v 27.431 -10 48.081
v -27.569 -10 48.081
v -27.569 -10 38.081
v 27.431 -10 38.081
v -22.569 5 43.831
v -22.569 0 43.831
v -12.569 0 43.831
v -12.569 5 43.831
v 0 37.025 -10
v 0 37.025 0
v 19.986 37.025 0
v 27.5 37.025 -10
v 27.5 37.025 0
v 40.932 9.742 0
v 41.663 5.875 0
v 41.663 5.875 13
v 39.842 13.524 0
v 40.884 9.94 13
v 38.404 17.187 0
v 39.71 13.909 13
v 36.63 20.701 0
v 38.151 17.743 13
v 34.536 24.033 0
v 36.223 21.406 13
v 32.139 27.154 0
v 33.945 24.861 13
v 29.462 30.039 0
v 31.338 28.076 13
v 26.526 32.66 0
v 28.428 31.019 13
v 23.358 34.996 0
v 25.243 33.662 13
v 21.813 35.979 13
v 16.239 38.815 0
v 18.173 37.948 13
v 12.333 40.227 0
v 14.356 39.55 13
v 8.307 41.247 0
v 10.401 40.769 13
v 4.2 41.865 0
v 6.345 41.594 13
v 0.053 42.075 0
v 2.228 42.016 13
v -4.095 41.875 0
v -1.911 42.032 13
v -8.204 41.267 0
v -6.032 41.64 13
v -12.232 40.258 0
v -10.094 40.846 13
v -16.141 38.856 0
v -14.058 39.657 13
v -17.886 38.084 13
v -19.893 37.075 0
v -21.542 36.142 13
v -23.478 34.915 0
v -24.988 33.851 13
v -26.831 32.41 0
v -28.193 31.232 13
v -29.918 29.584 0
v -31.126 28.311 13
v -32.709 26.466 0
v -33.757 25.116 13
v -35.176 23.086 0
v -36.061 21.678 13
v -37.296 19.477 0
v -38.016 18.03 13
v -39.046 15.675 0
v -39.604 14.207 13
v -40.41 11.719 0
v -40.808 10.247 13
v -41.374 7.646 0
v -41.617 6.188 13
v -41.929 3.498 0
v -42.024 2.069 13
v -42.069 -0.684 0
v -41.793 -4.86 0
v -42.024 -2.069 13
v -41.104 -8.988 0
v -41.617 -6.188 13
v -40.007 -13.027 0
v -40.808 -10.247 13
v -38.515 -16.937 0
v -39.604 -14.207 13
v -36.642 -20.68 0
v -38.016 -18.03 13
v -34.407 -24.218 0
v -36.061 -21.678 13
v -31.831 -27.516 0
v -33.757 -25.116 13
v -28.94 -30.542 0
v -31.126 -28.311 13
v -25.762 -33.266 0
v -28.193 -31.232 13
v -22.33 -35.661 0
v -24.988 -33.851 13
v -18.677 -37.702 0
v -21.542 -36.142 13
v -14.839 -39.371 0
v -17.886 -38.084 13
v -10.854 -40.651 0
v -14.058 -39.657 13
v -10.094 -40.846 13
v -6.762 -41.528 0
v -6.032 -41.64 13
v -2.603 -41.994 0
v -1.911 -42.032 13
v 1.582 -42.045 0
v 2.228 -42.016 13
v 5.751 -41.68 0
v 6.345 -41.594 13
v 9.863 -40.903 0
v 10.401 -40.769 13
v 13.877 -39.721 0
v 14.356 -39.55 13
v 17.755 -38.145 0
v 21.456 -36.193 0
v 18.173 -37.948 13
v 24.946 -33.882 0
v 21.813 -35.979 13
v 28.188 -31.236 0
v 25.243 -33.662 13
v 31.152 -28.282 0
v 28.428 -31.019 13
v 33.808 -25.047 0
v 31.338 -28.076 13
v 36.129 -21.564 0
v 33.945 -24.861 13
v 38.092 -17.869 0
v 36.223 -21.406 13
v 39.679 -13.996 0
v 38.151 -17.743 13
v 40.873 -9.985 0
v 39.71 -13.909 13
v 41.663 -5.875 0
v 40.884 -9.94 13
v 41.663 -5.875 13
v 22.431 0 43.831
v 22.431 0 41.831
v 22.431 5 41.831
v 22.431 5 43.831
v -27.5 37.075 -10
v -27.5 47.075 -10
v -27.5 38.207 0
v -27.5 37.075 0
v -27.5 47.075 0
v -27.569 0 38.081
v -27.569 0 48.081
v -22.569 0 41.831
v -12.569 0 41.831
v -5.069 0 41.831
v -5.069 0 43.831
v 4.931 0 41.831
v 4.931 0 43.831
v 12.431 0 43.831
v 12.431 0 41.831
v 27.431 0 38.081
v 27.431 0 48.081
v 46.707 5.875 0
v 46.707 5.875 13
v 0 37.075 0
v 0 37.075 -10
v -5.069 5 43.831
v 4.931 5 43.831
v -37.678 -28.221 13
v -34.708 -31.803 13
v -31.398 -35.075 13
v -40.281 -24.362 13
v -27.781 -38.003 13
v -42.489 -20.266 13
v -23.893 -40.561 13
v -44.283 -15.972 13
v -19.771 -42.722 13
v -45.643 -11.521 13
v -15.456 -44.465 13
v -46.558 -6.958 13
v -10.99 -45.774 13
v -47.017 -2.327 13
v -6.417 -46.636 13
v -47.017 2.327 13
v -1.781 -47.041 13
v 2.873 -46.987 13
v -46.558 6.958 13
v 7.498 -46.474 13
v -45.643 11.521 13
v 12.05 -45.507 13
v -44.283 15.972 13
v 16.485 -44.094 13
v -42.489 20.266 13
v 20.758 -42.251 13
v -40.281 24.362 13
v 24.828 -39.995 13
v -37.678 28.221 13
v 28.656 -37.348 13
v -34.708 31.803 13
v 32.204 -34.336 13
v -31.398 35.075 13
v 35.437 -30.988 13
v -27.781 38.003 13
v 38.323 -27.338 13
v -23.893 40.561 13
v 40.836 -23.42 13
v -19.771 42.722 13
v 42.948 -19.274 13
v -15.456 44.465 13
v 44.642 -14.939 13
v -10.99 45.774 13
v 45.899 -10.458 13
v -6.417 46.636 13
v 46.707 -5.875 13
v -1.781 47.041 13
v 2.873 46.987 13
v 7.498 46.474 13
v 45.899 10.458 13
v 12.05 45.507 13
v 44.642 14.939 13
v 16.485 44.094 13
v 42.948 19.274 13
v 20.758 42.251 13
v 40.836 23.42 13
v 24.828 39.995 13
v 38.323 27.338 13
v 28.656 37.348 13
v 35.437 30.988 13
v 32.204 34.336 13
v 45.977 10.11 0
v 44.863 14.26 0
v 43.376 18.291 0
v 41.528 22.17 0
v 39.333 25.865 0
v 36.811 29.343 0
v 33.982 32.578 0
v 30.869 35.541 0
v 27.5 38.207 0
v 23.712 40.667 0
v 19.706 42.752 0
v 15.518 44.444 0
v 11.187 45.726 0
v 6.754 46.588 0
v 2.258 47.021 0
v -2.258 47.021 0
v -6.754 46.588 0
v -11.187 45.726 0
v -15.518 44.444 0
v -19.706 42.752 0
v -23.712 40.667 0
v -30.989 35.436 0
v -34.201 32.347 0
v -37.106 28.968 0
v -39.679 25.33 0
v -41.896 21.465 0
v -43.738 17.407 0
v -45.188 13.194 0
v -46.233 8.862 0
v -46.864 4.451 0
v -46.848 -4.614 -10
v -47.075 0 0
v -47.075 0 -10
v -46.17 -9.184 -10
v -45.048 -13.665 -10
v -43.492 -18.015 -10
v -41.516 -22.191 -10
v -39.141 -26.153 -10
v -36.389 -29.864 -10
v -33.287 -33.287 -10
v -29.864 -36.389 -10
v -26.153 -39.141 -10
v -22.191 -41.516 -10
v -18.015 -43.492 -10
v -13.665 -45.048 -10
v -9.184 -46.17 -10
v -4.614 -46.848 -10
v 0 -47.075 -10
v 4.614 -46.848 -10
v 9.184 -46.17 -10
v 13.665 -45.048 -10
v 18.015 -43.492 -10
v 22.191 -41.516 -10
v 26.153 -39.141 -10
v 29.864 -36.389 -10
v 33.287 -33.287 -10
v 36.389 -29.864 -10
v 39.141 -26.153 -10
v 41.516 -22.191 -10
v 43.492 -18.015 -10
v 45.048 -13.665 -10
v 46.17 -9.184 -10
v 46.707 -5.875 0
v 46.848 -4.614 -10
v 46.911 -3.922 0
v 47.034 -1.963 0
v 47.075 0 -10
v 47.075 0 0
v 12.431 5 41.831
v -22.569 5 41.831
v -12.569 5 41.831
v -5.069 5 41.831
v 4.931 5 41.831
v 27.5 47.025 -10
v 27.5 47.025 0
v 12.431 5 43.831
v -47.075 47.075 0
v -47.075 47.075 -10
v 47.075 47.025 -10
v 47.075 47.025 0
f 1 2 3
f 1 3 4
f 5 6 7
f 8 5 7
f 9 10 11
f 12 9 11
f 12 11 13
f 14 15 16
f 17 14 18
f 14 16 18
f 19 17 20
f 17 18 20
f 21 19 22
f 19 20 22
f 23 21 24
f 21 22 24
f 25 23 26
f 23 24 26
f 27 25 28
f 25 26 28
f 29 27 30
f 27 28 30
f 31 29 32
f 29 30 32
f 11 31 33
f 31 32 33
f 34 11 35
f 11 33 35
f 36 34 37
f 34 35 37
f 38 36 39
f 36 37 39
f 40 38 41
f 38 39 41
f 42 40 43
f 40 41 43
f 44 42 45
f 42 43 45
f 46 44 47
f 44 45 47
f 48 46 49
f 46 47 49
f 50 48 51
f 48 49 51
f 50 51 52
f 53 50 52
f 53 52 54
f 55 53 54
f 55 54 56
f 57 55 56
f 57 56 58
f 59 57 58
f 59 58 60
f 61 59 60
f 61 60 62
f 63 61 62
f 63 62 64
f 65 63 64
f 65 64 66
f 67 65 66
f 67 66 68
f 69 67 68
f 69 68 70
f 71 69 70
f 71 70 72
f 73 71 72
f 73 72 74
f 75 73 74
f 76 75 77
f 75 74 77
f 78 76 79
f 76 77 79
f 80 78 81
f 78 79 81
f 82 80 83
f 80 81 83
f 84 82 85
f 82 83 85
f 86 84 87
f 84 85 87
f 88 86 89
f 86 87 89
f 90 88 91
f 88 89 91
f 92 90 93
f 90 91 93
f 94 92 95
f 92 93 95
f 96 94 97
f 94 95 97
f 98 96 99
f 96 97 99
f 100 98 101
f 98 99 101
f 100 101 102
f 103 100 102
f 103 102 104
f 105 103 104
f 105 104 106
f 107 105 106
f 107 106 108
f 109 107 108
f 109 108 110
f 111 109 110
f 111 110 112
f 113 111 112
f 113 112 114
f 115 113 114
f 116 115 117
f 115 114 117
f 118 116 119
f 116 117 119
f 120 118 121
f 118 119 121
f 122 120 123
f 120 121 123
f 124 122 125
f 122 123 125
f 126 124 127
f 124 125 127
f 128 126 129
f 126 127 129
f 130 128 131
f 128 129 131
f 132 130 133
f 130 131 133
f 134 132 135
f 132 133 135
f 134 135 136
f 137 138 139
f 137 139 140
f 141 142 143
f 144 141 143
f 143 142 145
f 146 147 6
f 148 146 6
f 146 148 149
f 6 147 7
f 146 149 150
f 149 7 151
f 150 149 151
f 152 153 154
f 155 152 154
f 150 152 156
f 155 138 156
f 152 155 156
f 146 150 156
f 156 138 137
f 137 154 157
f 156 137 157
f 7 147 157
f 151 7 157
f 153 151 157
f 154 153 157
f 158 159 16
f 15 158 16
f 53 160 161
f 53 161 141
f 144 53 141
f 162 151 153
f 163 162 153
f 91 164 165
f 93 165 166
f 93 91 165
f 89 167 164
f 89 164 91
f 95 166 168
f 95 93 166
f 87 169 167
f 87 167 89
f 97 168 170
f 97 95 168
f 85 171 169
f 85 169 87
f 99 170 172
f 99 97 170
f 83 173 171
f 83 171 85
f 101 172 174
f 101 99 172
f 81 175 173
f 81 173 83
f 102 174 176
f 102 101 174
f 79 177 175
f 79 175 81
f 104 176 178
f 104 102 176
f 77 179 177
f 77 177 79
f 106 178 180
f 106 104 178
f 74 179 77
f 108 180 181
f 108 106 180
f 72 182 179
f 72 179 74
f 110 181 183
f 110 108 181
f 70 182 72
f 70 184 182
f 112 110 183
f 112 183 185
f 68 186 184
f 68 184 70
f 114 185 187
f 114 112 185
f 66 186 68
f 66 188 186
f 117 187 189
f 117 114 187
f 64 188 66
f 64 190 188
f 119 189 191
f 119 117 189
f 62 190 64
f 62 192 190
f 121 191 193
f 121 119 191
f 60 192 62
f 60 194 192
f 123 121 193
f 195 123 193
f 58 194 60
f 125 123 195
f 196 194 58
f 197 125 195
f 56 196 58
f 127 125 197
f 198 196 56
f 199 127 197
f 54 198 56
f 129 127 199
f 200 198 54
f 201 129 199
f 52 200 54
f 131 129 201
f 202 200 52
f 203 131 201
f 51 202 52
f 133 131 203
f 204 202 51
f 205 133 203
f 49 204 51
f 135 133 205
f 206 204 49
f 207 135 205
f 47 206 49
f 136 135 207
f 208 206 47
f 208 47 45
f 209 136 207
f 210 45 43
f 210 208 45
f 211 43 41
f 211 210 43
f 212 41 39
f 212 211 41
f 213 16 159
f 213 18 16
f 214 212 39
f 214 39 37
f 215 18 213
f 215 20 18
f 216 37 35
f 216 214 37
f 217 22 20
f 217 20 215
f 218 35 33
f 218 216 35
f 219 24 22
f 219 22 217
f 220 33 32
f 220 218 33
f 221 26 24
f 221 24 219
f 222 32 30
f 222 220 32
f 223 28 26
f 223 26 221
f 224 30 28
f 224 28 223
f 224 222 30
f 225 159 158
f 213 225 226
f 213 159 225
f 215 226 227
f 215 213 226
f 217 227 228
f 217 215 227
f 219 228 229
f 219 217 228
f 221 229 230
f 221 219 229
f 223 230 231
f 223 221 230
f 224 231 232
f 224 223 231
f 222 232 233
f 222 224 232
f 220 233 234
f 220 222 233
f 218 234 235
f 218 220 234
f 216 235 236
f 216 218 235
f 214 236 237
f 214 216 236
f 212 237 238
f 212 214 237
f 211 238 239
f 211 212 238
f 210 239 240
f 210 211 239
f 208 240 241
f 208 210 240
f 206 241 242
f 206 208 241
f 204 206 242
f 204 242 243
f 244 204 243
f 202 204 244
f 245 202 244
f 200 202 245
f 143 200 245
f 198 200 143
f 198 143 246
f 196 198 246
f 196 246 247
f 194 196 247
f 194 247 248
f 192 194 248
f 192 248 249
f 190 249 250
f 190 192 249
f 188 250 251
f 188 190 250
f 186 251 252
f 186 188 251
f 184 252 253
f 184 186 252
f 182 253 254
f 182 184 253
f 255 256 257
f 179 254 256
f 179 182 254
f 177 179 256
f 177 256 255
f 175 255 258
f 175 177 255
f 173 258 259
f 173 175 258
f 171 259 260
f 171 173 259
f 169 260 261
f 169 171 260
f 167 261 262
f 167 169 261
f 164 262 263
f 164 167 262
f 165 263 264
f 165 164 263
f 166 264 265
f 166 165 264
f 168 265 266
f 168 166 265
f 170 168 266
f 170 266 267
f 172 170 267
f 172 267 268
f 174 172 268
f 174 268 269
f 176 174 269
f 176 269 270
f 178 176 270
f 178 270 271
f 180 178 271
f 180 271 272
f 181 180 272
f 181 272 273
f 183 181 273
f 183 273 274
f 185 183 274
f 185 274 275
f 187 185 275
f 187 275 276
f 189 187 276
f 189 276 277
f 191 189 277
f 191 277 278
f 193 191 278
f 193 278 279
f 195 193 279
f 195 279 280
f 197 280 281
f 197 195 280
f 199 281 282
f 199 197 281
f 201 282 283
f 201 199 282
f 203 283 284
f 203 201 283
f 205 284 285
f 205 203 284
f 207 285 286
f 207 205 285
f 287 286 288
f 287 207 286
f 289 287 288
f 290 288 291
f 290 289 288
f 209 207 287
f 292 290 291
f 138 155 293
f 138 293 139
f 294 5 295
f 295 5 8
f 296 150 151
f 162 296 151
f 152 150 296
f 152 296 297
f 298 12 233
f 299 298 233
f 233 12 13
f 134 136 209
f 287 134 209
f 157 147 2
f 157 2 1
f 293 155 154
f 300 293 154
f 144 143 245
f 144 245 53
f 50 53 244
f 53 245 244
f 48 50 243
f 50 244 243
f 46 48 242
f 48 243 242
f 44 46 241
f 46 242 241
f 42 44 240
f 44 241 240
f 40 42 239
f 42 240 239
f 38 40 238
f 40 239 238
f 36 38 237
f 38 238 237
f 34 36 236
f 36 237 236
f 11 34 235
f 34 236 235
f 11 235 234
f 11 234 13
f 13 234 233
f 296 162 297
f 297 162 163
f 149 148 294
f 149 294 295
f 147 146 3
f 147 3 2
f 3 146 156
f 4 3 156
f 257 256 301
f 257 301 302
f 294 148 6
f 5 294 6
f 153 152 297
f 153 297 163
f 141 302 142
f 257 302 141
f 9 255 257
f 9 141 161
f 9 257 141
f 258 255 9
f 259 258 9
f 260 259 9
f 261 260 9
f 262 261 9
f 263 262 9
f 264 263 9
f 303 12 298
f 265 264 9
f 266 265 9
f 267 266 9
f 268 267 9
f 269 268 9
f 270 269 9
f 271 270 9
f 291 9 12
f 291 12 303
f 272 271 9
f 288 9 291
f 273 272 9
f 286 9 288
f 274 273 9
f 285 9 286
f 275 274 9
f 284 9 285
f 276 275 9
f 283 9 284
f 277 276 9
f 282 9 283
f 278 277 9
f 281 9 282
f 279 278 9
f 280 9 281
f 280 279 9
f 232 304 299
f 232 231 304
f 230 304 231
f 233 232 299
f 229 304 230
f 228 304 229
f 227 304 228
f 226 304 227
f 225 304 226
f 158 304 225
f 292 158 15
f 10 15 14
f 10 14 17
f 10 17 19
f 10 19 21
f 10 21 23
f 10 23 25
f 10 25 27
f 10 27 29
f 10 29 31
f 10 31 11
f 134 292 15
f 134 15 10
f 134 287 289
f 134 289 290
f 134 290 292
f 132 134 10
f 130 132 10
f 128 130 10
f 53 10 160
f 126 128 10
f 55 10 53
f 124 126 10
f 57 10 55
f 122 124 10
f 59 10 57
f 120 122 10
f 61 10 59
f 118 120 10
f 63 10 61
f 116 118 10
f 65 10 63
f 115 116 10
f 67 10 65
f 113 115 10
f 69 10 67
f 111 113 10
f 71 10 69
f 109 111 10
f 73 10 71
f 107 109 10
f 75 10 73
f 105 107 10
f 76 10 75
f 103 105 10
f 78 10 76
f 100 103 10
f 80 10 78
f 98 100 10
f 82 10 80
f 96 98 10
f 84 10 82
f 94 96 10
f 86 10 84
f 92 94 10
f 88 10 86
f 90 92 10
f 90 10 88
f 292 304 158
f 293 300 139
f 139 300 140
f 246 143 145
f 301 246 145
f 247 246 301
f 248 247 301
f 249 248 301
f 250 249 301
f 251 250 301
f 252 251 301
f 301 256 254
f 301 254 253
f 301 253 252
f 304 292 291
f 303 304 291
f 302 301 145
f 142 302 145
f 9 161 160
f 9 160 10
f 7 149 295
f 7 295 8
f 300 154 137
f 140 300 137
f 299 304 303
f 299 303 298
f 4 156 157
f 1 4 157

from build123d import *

# Parameters (mm, degrees)
F0_W       = 55
F0_H       = 10
F0_W_2     = 10
F0_H_2     = 2
F1_DEPTH   = 10
F3_DEPTH   = 5
F2_W       = 5
F2_H       = 13
F4_ANGLE   = 180
F5_DEPTH   = 47.075
F6_ANGLE   = 90
F7_W       = 27.5
F7_H       = 10
F8_DEPTH   = 10
F10_DEPTH  = 47.025
F11_DEPTH  = 37.025
F10_FACE_W = 5
F10_FACE_H = 13
F12_ANGLE  = 90
F14_DEPTH  = 13


with BuildPart() as f1:
    # F0 (on Front) → F1 (new body)
    with BuildSketch(Plane.XZ):
        with Locations((-0.0686085224, 43.0809994042)):
            Rectangle(F0_W, F0_H)
        with Locations((-17.5686085224, 42.8309994042)):
            Rectangle(F0_W_2, F0_H_2, mode=Mode.SUBTRACT)
        with Locations((-0.0686085224, 42.8309994042)):
            Rectangle(F0_W_2, F0_H_2, mode=Mode.SUBTRACT)
        with Locations((17.4313914776, 42.8309994042)):
            Rectangle(F0_W_2, F0_H_2, mode=Mode.SUBTRACT)
        with Locations((-17.5686085224, 42.8309994042)):
            Rectangle(F0_W_2, F0_H_2)
        with Locations((-0.0686085224, 42.8309994042)):
            Rectangle(F0_W_2, F0_H_2)
        with Locations((17.4313914776, 42.8309994042)):
            Rectangle(F0_W_2, F0_H_2)
    extrude(amount=F1_DEPTH)

    # F0 (on Front) → F3 (join)
    with BuildSketch(Plane.XZ):
        with Locations((17.4313914776, 42.8309994042)):
            Rectangle(F0_W_2, F0_H_2)
        with Locations((-0.0686085224, 42.8309994042)):
            Rectangle(F0_W_2, F0_H_2)
        with Locations((-17.5686085224, 42.8309994042)):
            Rectangle(F0_W_2, F0_H_2)
    extrude(amount=-F3_DEPTH)


with BuildPart() as f4:
    # F2 (on Front) → F4 (revolve)
    with BuildSketch(Plane.XZ):
        with Locations((-44.575, 6.5)):
            Rectangle(F2_W, F2_H)
        Polygon((0, 0), (-42.075, 0), (-47.075, 0), (-47.075, -10), (0, -10), align=None)
    revolve(axis=Axis((0, 0, -5), (0, 0, 1)), revolution_arc=F4_ANGLE)

    # F2 (on Front) → F5 (join)
    with BuildSketch(Plane.XZ):
        Polygon((0, 0), (-42.075, 0), (-47.075, 0), (-47.075, -10), (0, -10), align=None)
    extrude(amount=-F5_DEPTH)

    # F2 (on Front) → F6 (revolve)
    with BuildSketch(Plane.XZ):
        with Locations((-44.575, 6.5)):
            Rectangle(F2_W, F2_H)
    revolve(axis=Axis((0, 0, -5), (0, 0, -1)), revolution_arc=F6_ANGLE)

    # F7 (on face) → F8 (cut)
    with BuildSketch(Plane(origin=(0, 47.075, 0), x_dir=(-1, 0, 0), z_dir=(0, 1, 0))):
        with Locations((13.75, -5)):
            Rectangle(F7_W, F7_H)
    extrude(amount=-F8_DEPTH, mode=Mode.SUBTRACT)

    # F9 (on face) → F10 (join)
    with BuildSketch(Plane(origin=(0, 0, 0), x_dir=(-1, 0, 0), z_dir=(0, 1, 0))):
        Polygon((-27.5, 0), (-42.075, 0), (-47.075, 0), (-47.075, -10), (-27.5, -10), align=None)
    extrude(amount=F10_DEPTH)

    # F11 (add): a face of the model
    f11_faces = [f4.faces().sort_by_distance(p)[0] for p in [
        (13.75, 0, -5),
    ]]
    extrude(f11_faces, amount=F11_DEPTH)

    # F10_face (on face) → F12 (revolve)
    with BuildSketch(Plane(origin=(13.75, 0, -5), x_dir=(-1, 0, 0), z_dir=(0, 1, 0))):
        with Locations((-30.825, 11.5)):
            Rectangle(F10_FACE_W, F10_FACE_H)
    revolve(axis=Axis((0, 0, -5), (0, 0, 1)), revolution_arc=F12_ANGLE)

    # F13 (on face) → F14 (cut)
    with BuildSketch(Plane.XY.offset(13)):
        with BuildLine():
            Line((46.7069587963, 5.875), (41.6628131551, 5.875))
            ThreePointArc((41.6628131551, 5.875), (41.9718267919, 2.944720827), (42.075, 0))
            ThreePointArc((42.075, 0), (41.9718267919, -2.944720827), (41.6628131551, -5.875))
            Line((41.6628131551, -5.875), (46.7069587963, -5.875))
            ThreePointArc((46.7069587963, -5.875), (46.9828996037, -2.9432583699), (47.075, 0))
            ThreePointArc((47.075, 0), (46.9828996037, 2.9432583699), (46.7069587963, 5.875))
        make_face()
    extrude(amount=-F14_DEPTH, mode=Mode.SUBTRACT)


solid = Compound([f1.part, f4.part])
